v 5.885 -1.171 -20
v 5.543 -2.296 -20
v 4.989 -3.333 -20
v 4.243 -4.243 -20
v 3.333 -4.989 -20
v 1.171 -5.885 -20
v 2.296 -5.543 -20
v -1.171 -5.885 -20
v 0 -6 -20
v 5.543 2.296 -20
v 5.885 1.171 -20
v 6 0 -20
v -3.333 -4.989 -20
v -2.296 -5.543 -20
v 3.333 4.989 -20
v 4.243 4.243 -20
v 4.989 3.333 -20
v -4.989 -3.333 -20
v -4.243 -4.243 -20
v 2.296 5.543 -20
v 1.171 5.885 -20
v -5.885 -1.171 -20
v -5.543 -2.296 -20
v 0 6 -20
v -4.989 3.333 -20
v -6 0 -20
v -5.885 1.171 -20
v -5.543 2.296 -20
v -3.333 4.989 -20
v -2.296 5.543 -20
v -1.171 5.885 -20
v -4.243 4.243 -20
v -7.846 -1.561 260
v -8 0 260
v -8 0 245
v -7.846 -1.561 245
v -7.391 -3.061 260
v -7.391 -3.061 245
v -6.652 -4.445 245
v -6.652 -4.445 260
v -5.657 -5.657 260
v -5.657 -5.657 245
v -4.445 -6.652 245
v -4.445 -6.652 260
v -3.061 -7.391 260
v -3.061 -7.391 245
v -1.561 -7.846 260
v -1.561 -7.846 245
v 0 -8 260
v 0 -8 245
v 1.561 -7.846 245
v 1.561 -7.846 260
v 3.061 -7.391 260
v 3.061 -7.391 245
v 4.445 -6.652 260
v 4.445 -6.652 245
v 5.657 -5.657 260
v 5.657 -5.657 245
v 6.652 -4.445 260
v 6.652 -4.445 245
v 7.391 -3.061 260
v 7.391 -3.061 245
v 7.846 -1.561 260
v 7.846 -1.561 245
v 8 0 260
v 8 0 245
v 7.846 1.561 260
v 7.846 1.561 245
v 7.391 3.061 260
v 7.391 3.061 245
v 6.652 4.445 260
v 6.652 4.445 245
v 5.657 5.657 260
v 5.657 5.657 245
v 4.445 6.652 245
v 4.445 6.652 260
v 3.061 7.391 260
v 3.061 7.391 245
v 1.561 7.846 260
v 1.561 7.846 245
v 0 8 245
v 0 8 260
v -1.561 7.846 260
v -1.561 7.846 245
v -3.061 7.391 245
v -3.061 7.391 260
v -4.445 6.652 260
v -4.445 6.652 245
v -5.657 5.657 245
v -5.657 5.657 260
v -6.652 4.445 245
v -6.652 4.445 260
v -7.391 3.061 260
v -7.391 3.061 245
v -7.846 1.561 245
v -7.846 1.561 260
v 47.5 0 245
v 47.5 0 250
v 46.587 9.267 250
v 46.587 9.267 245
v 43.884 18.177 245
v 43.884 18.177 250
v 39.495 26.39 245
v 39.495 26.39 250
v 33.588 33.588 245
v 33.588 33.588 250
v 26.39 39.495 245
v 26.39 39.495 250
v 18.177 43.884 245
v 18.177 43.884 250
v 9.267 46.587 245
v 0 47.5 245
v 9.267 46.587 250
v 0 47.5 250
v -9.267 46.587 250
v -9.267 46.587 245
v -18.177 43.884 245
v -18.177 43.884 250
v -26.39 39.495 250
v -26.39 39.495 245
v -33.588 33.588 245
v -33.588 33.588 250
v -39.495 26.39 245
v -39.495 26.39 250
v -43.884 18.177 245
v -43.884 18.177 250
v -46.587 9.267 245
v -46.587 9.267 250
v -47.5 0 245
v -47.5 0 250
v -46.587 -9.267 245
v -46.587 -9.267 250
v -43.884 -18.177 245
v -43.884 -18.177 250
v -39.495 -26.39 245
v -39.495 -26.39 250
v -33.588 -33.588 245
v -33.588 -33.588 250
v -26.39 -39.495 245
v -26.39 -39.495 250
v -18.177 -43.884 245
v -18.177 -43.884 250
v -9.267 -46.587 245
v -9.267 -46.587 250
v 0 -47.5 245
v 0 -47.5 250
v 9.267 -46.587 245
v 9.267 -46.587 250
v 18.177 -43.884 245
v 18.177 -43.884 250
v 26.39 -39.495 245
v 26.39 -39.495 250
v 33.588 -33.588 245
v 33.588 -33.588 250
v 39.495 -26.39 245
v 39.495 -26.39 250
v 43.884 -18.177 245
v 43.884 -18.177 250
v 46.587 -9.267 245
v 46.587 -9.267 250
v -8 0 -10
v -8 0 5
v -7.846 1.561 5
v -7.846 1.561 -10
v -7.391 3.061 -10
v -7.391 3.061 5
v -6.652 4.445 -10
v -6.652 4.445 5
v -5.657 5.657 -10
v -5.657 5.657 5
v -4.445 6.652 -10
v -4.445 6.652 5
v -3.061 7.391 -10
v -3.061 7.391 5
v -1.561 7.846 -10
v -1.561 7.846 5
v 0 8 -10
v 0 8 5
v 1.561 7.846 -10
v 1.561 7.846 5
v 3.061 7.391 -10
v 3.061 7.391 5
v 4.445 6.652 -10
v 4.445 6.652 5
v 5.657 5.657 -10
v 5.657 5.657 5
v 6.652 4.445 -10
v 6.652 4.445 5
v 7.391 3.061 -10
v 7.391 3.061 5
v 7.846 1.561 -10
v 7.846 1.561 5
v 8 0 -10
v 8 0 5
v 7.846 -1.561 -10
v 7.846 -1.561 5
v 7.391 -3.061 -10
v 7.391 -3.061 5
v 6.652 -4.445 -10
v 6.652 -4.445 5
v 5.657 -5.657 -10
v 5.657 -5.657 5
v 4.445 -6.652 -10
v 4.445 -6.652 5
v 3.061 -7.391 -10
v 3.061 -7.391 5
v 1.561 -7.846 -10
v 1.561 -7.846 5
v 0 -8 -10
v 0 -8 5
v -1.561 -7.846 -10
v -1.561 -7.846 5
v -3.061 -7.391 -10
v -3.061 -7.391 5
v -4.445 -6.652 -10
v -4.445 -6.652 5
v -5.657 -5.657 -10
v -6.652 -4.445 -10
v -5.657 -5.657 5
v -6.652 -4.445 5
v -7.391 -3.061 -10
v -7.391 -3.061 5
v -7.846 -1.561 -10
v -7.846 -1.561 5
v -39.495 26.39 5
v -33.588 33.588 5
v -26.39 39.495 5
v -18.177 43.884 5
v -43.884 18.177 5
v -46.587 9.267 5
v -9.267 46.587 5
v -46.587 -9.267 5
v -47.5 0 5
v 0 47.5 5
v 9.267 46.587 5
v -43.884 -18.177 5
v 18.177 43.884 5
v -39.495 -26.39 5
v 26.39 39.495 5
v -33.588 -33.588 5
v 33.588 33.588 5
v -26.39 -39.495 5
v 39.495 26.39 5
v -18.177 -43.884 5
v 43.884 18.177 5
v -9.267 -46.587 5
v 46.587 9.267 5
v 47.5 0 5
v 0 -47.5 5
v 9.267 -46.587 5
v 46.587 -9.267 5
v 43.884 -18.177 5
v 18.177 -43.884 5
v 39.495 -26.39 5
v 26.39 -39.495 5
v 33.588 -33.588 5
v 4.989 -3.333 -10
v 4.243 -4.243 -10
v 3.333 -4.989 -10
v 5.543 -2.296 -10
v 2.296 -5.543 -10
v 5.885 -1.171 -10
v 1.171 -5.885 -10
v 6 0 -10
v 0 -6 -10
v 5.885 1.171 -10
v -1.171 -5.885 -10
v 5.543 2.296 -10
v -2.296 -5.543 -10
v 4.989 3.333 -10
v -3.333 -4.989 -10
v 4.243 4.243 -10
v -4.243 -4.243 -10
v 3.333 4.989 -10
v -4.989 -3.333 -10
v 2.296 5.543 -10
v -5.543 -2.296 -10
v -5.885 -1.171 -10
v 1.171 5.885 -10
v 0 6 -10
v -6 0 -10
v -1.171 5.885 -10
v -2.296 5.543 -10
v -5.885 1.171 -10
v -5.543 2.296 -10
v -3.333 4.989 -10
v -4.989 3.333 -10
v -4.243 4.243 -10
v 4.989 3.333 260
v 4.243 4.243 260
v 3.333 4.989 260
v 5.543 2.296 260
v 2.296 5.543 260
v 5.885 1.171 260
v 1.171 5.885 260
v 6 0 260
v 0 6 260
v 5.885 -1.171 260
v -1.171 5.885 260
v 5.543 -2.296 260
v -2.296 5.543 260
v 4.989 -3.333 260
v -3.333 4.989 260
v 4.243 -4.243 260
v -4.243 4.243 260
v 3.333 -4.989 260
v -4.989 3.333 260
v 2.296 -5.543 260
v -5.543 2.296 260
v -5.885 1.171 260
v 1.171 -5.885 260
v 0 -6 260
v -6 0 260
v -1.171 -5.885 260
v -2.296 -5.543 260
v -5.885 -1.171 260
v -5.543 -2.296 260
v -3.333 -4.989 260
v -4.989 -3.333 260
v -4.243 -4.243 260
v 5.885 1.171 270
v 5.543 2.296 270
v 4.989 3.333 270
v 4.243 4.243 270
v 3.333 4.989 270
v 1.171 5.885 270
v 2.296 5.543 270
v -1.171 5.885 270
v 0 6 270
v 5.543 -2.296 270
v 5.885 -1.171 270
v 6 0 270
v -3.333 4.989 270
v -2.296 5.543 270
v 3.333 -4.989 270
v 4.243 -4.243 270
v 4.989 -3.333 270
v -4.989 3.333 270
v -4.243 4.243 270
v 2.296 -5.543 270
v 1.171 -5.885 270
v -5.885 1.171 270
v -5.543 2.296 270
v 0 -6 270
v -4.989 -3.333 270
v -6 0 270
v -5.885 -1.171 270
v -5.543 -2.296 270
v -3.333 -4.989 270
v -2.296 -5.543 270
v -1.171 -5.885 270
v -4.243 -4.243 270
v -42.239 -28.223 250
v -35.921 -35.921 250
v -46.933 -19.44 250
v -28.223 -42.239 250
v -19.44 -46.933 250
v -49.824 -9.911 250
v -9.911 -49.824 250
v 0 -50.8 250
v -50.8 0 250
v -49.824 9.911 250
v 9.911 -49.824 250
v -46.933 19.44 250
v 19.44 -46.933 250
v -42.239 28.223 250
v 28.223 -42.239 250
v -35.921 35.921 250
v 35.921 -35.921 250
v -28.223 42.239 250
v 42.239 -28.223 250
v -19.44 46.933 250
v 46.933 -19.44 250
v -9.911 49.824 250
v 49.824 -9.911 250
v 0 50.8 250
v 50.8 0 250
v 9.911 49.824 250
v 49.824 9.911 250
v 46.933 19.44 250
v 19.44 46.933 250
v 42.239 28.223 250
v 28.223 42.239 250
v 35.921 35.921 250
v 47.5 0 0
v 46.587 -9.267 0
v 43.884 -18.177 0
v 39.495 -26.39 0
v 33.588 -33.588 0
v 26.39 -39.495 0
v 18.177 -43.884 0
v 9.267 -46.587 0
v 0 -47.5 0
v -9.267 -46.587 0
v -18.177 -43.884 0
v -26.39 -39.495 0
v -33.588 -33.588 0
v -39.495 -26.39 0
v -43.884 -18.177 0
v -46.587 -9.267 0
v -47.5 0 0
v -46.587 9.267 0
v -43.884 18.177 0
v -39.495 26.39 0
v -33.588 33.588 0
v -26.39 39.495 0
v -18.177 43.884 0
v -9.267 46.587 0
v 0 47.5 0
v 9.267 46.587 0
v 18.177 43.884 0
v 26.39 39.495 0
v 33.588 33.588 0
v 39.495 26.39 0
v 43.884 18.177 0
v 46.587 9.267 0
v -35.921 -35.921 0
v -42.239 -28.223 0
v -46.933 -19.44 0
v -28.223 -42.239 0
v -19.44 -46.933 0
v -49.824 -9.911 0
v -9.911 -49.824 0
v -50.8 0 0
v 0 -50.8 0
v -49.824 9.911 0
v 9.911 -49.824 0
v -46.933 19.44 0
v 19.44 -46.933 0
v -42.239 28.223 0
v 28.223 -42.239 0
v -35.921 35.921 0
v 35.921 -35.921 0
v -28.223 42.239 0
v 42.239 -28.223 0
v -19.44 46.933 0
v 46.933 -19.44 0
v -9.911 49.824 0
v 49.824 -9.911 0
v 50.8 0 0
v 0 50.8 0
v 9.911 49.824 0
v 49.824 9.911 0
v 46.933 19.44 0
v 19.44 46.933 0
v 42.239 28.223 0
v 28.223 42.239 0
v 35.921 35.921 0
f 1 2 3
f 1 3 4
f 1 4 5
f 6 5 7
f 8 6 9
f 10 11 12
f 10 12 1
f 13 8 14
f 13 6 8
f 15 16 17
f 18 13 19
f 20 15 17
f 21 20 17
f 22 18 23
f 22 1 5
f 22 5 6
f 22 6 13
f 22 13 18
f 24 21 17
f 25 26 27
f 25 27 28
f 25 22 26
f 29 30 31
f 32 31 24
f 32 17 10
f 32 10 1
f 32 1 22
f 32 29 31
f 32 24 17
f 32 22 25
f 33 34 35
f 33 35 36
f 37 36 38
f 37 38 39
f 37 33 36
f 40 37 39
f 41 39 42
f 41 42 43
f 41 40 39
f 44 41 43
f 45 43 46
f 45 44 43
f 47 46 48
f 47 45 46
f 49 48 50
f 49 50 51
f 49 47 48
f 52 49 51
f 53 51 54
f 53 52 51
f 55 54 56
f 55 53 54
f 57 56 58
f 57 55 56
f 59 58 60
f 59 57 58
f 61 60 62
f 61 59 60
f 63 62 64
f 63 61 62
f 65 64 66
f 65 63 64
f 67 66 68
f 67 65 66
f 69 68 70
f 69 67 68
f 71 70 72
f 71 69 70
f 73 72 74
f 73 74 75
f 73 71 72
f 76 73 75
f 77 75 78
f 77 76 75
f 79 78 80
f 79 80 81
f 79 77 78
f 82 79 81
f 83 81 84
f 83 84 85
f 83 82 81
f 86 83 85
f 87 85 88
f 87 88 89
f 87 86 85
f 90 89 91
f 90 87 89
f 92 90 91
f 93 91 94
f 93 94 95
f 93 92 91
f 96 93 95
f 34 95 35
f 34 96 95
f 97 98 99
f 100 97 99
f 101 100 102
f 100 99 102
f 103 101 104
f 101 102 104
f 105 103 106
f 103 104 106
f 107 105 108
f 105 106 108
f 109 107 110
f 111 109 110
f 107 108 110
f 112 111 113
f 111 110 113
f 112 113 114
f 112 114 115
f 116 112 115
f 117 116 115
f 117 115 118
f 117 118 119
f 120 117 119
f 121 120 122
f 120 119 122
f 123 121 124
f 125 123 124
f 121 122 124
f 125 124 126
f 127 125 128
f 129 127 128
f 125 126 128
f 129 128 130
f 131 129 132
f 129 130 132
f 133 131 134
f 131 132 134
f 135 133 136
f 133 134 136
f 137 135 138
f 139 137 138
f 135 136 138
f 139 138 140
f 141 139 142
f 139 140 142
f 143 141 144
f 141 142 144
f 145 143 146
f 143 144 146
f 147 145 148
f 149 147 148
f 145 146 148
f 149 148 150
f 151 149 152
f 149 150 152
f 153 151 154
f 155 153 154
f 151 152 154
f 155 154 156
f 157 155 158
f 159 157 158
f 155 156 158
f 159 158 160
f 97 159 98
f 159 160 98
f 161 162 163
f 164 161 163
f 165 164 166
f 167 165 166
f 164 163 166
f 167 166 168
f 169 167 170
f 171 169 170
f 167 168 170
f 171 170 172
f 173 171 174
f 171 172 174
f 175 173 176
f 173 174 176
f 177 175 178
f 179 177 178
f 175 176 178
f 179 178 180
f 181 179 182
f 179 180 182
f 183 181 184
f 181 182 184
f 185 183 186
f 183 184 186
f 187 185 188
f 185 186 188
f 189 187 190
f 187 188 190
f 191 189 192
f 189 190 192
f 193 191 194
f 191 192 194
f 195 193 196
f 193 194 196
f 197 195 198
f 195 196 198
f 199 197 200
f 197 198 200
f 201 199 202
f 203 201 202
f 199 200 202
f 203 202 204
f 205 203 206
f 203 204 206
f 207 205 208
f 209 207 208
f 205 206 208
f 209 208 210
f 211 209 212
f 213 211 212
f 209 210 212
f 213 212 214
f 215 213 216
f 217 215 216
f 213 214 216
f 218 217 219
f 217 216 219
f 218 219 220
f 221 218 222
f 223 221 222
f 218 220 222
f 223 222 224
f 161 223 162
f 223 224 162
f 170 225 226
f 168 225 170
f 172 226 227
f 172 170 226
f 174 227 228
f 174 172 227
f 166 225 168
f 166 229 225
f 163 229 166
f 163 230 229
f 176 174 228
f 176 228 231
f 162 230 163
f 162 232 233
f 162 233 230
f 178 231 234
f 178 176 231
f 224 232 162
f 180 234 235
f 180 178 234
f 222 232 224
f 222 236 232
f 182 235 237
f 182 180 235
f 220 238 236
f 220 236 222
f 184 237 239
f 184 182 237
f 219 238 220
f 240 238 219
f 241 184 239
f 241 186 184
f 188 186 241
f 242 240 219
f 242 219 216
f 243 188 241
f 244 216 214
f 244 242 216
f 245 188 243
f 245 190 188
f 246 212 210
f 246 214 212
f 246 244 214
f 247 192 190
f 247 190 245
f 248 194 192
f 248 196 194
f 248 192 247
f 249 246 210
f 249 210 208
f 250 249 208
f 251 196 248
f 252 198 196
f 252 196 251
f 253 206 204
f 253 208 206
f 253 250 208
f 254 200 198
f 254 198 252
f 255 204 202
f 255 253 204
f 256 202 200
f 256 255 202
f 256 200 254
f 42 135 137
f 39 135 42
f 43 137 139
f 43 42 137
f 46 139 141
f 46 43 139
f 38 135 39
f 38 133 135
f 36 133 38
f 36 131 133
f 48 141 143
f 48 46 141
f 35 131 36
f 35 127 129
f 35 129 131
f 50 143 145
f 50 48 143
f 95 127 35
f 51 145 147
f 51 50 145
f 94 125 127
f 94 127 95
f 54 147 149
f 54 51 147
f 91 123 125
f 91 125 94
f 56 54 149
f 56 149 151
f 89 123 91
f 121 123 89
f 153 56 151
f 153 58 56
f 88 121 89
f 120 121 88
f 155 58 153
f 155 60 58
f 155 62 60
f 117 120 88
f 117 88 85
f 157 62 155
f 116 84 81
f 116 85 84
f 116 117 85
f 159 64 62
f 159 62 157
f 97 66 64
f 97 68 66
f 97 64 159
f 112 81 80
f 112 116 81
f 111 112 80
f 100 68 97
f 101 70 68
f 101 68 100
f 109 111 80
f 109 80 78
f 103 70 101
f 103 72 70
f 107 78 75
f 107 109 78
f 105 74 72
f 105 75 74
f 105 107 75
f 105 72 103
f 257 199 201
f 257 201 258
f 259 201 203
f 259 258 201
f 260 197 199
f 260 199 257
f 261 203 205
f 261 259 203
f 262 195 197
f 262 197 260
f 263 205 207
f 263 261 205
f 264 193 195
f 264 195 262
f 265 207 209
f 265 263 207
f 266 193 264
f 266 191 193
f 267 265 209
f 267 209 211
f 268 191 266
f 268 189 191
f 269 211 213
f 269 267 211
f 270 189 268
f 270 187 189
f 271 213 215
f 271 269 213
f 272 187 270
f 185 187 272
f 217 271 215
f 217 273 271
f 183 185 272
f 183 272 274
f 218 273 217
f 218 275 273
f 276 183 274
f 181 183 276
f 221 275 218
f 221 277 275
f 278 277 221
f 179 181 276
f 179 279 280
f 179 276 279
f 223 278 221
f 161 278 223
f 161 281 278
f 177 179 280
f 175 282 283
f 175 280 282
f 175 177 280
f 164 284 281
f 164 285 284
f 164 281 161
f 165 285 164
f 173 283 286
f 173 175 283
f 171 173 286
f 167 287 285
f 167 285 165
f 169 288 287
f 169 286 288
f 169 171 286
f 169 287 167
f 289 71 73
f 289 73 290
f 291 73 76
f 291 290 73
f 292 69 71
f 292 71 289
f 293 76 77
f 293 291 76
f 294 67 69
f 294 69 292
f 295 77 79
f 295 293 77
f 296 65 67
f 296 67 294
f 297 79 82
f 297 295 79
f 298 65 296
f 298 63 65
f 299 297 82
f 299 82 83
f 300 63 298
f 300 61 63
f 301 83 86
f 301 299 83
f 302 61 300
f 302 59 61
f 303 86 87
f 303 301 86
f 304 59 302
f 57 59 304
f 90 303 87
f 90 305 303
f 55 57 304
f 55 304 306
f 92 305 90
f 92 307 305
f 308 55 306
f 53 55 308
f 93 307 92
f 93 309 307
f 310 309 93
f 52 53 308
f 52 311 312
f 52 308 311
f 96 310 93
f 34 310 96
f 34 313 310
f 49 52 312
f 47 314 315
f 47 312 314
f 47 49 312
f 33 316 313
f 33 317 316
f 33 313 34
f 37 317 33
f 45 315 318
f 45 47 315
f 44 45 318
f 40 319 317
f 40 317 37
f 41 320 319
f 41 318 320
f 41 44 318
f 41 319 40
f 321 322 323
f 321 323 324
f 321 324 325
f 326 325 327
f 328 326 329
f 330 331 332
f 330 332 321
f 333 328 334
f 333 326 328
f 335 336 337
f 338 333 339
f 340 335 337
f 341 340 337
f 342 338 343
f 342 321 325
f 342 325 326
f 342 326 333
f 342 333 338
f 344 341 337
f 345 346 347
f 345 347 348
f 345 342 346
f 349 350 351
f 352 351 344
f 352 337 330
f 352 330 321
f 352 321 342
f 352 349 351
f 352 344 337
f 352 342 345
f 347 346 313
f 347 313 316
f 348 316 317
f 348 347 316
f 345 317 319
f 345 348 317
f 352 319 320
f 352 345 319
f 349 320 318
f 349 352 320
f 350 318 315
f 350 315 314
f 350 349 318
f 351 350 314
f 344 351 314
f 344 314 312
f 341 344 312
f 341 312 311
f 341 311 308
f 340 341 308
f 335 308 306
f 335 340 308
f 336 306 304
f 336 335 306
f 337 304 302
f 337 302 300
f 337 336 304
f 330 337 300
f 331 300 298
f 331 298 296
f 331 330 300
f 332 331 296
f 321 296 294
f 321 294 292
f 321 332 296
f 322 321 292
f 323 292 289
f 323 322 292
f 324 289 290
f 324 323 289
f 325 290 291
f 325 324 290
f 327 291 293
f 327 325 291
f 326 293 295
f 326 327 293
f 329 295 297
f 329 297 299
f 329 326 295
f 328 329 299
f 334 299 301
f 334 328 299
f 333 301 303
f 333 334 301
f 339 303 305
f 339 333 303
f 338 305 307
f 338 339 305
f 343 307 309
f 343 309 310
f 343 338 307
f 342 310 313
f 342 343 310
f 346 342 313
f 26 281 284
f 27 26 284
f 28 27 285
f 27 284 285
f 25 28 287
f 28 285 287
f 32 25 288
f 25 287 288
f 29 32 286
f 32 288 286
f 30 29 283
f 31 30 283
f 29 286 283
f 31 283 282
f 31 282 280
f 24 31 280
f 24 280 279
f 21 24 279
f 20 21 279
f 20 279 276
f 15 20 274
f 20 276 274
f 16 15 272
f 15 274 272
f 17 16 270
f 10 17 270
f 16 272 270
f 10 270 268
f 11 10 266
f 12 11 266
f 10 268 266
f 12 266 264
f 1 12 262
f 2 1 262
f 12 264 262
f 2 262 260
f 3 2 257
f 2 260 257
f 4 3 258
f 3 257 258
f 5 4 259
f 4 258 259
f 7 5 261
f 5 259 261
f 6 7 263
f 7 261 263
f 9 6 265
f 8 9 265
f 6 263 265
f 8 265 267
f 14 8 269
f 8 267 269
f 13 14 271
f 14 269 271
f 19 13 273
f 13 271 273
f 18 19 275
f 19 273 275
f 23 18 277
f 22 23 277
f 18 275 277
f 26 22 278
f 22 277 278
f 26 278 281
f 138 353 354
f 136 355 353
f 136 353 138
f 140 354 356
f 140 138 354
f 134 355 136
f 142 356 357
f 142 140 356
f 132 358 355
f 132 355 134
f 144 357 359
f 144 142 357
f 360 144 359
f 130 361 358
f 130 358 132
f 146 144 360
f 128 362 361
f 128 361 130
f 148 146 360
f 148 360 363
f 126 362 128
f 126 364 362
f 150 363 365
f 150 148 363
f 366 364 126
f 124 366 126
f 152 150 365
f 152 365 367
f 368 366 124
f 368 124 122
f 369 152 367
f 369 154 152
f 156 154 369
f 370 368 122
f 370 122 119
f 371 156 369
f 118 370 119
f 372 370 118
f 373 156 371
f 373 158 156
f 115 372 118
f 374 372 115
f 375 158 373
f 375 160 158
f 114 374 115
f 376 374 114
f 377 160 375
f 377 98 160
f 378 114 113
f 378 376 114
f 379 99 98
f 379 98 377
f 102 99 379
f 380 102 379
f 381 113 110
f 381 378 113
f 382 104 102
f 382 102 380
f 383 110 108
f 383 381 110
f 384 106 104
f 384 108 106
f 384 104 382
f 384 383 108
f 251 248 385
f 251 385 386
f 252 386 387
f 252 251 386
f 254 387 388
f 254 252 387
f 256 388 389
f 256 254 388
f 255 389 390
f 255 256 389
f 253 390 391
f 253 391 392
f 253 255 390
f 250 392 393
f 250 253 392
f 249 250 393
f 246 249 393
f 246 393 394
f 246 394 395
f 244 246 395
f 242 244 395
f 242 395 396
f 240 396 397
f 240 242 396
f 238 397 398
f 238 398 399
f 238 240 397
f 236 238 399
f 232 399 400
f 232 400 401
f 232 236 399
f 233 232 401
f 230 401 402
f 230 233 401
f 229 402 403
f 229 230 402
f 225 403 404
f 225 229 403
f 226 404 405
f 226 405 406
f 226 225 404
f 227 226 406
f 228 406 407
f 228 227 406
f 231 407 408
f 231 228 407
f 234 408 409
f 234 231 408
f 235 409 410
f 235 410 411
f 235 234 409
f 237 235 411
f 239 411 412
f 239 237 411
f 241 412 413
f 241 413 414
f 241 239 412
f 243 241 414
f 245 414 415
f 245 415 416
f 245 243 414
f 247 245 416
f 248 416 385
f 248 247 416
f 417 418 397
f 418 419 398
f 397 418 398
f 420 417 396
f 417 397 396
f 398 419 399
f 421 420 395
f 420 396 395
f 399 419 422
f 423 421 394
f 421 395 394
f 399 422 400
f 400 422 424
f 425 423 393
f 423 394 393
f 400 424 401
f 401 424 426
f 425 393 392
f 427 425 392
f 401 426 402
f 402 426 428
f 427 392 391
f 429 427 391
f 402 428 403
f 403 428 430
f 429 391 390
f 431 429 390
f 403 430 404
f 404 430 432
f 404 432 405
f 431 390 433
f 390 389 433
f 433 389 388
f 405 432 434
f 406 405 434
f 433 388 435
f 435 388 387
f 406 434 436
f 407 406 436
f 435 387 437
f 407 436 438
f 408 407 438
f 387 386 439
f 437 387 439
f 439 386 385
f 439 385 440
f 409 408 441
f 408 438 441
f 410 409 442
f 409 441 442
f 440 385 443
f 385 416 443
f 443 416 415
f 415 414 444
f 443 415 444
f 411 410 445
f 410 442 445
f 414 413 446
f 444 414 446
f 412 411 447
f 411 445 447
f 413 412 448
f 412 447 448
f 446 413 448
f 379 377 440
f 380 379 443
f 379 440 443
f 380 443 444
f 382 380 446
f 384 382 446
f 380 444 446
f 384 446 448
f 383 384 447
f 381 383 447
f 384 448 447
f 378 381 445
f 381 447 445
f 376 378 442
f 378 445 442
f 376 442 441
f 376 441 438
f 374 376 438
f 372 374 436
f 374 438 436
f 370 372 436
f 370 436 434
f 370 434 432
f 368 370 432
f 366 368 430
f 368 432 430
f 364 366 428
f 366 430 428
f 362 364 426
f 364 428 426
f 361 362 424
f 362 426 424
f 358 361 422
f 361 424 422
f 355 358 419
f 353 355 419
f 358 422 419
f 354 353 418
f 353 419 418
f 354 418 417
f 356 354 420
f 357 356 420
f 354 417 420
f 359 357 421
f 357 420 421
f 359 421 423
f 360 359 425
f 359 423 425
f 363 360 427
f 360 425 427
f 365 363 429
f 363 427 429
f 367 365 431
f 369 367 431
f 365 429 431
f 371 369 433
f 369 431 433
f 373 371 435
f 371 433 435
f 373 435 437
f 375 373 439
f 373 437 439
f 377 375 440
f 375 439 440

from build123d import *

# Parameters (mm, degrees)
SKETCH1_R           = 50.8
BOSS_EXTRUDE1_DEPTH = 250
SKETCH2_R           = 47.5
CUT_EXTRUDE1_DEPTH  = 5
CUT_EXTRUDE2_START  = -5
SKETCH3_R           = 47.5
CUT_EXTRUDE2_DEPTH  = 5
SKETCH4_R           = 8
BOSS_EXTRUDE2_DEPTH = 15
BOSS_EXTRUDE3_START = 15
SKETCH5_R           = 8
BOSS_EXTRUDE3_DEPTH = 15
SKETCH7_R           = 6
BOSS_EXTRUDE4_DEPTH = 10
BOSS_EXTRUDE5_START = 10
SKETCH8_R           = 6
BOSS_EXTRUDE5_DEPTH = 10


with BuildPart() as part:
    # Sketch1 → Boss-Extrude1 (new body)
    with BuildSketch(Plane.XY):
        Circle(SKETCH1_R)
    extrude(amount=BOSS_EXTRUDE1_DEPTH)

    # Sketch2 → Cut-Extrude1 (cut)
    with BuildSketch(Plane.XY.offset(250)):
        Circle(SKETCH2_R)
    extrude(amount=-CUT_EXTRUDE1_DEPTH, mode=Mode.SUBTRACT)

    # Sketch3 → Cut-Extrude2 (cut)
    with BuildSketch(Plane(origin=(0, 0, 0), x_dir=(-1, 0, 0), z_dir=(0, 0, -1)).offset(CUT_EXTRUDE2_START)):
        with Locations(Location((0, 0, 0), (0, 0, 180))):
            Circle(SKETCH3_R)
    extrude(amount=CUT_EXTRUDE2_DEPTH, mode=Mode.SUBTRACT)

    # Sketch4 → Boss-Extrude2 (add)
    with BuildSketch(Plane(origin=(0, 0, 5), x_dir=(-1, 0, 0), z_dir=(0, 0, -1))):
        Circle(SKETCH4_R)
    extrude(amount=BOSS_EXTRUDE2_DEPTH)

    # Sketch5 → Boss-Extrude3 (add)
    with BuildSketch(Plane.XY.offset(245).offset(BOSS_EXTRUDE3_START)):
        with Locations(Location((0, 0, 0), (0, 0, 180))):
            Circle(SKETCH5_R)
    extrude(amount=-BOSS_EXTRUDE3_DEPTH)

    # Sketch7 → Boss-Extrude4 (add)
    with BuildSketch(Plane(origin=(0, 0, -10), x_dir=(-1, 0, 0), z_dir=(0, 0, -1))):
        Circle(SKETCH7_R)
    extrude(amount=BOSS_EXTRUDE4_DEPTH)

    # Sketch8 → Boss-Extrude5 (add)
    with BuildSketch(Plane.XY.offset(260).offset(BOSS_EXTRUDE5_START)):
        with Locations(Location((0, 0, 0), (0, 0, 180))):
            Circle(SKETCH8_R)
    extrude(amount=-BOSS_EXTRUDE5_DEPTH)


solid = part.part
